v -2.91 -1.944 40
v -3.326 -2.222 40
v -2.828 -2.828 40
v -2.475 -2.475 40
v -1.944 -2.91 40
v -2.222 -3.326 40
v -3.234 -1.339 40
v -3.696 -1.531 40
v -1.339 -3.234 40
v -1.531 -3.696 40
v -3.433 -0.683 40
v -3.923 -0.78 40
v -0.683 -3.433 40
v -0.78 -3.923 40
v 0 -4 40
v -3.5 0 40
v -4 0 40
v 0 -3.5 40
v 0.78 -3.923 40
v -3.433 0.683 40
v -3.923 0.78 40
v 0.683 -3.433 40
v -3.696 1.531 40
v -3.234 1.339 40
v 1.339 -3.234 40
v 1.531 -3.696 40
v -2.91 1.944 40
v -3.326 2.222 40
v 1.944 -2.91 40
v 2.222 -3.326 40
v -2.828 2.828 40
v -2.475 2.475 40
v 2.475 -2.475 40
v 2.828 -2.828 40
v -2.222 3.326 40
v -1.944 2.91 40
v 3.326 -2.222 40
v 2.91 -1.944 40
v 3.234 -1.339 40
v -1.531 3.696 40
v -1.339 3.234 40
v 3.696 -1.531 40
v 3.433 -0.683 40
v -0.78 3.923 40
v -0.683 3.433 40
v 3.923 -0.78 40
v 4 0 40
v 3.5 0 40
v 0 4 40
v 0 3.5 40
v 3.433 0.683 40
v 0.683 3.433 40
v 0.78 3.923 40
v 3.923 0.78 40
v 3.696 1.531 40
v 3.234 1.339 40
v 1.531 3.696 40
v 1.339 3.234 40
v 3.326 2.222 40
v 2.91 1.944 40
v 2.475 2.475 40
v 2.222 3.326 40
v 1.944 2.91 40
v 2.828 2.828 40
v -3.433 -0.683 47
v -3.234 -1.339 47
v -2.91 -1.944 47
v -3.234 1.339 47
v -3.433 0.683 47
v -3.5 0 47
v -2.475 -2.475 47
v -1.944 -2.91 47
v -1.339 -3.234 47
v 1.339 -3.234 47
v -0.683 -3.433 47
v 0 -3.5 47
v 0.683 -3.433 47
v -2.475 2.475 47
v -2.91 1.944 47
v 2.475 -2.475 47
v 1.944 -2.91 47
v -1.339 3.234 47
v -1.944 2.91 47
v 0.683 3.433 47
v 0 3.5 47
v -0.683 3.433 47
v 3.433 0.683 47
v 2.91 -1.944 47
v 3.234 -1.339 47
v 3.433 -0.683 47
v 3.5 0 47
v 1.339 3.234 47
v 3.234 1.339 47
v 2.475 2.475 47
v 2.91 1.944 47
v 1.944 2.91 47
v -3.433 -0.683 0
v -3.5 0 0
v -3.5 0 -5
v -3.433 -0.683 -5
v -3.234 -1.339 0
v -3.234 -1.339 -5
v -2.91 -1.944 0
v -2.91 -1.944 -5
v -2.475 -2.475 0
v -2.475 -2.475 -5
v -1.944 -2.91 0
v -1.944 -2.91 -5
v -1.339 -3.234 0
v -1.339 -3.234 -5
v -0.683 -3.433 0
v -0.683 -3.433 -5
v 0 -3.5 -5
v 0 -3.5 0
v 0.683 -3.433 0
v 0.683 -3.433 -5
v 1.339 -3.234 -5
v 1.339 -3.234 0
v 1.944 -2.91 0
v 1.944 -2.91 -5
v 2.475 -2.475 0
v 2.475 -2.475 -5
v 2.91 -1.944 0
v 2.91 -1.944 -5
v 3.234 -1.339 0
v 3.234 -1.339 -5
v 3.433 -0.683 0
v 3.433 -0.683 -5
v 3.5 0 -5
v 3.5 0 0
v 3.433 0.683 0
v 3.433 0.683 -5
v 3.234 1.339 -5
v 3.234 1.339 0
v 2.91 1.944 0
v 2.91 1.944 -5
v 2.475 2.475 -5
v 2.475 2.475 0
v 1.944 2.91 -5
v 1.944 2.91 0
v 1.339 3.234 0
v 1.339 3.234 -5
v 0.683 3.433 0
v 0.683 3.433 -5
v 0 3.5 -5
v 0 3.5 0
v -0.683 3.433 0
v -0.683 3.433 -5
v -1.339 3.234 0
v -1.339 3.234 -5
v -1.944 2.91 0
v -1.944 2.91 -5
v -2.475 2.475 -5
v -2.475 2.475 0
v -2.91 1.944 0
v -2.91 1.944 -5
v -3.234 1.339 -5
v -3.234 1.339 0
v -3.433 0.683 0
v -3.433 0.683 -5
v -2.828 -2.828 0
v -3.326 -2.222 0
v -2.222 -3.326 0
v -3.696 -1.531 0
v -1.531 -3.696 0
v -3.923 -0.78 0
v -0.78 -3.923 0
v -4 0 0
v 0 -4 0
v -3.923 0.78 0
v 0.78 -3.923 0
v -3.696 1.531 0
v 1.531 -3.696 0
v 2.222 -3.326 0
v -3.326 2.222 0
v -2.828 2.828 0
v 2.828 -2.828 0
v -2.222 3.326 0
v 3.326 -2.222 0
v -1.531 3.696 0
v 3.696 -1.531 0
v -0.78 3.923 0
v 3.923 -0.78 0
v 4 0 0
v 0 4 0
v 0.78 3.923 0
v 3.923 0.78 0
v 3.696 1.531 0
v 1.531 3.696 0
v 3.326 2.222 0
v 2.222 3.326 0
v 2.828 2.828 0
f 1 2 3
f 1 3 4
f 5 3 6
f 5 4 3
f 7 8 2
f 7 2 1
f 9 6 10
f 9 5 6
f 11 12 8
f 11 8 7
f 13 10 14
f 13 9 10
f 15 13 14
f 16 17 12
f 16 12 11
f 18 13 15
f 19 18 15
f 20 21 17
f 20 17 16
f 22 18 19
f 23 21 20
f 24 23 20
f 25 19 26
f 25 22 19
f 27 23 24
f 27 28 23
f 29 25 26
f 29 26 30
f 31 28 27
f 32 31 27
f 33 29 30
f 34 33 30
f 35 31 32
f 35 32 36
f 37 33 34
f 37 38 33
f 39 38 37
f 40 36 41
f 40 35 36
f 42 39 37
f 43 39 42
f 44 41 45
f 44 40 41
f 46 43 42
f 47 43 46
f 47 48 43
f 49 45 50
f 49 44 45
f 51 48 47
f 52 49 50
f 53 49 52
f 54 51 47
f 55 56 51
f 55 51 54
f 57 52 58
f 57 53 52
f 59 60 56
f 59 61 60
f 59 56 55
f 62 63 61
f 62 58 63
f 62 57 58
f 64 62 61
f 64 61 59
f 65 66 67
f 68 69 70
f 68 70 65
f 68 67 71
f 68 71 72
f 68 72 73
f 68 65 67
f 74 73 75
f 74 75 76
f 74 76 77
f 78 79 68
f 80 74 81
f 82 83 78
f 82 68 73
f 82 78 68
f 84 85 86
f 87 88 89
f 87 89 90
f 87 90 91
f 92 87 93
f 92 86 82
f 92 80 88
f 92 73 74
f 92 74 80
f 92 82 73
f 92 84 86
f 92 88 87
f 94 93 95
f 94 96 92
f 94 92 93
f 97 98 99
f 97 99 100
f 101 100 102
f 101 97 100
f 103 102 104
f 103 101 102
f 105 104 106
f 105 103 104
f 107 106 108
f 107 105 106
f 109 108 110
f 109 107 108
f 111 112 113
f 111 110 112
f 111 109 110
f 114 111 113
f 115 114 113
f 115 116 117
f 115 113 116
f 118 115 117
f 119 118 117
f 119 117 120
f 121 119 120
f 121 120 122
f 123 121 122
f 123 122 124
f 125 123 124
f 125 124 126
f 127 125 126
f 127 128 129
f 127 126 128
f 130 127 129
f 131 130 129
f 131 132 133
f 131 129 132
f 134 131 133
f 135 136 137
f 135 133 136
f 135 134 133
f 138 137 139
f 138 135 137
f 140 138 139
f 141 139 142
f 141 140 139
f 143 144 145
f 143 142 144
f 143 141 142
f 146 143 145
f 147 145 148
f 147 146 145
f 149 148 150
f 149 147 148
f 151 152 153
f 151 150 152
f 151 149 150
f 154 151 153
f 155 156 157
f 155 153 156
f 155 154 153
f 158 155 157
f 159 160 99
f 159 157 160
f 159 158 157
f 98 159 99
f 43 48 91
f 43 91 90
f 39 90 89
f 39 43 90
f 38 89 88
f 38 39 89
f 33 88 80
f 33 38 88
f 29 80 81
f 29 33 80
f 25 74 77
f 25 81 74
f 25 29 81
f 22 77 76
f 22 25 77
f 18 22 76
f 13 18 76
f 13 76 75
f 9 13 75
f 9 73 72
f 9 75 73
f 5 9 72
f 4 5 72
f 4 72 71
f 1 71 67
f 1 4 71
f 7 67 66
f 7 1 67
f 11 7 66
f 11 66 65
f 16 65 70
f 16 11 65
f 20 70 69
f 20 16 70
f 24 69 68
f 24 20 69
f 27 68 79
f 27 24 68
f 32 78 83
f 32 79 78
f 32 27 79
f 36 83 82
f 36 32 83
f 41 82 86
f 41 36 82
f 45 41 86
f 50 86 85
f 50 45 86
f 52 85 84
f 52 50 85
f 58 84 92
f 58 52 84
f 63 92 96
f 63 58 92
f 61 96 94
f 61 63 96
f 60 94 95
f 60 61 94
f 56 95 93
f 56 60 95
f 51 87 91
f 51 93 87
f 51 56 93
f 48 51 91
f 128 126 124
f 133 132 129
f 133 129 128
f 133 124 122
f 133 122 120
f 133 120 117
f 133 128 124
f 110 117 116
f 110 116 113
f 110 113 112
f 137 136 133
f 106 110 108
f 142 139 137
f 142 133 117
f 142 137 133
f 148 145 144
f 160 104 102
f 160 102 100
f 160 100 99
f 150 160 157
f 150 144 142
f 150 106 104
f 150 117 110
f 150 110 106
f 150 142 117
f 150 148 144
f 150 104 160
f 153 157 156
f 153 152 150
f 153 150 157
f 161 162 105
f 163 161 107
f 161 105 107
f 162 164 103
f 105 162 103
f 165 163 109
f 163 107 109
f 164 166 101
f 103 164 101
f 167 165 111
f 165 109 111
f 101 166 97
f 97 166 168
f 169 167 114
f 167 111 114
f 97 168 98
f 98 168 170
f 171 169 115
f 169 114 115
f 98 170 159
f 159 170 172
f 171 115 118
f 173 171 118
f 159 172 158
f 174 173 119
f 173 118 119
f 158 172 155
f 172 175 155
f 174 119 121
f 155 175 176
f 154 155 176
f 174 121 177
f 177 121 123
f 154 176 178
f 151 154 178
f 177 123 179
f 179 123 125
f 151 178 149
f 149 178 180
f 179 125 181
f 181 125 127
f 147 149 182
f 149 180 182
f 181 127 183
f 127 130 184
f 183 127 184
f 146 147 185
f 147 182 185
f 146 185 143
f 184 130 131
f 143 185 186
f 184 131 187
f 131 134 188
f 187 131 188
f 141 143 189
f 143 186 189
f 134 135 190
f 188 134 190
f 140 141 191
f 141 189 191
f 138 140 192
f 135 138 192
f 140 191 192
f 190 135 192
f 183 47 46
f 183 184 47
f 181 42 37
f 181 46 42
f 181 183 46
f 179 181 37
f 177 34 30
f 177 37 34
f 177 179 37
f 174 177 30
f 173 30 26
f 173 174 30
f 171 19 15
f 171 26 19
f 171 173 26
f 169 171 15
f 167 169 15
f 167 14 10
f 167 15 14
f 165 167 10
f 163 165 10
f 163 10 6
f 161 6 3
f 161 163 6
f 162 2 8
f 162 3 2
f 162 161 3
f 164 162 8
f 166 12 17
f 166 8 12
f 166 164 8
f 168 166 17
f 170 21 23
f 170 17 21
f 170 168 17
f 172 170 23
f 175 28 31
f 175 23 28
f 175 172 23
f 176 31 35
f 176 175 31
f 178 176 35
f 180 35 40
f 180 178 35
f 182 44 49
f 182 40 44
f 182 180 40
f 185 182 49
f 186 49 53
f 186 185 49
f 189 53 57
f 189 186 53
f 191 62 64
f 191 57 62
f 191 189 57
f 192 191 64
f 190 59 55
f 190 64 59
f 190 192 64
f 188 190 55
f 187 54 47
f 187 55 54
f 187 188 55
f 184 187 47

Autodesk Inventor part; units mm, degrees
ref_plane "YZ Plane" through (0, 0, 0) normal (1, 0, 0) x (0, 1, 0)
ref_plane "XZ Plane" through (0, 0, 0) normal (0, 1, 0) x (-1, 0, 0)
ref_plane "XY Plane" through (0, 0, 0) normal (0, 0, 1) x (1, 0, 0)
sketch "Skizze1" plane through (0, 0, 0) normal (0, 0, 1) x (1, 0, 0)
  circle A0 centre (0, 0) radius 4
  dimension "d0" = 8
extrude "Extrusion1" add sketch "Skizze1" along normal blind 40
sketch "Skizze2" plane through (0, 0, 0) normal (0, 0, -1) x (-1, 0, 0)
  circle A0 centre (0, 0) radius 3.5
  dimension "d3" = 7
extrude "Extrusion2" add sketch "Skizze2" along normal blind 5
thread "Gewinde1" size "M8x1.25" class "6g" standard "ANSI Metric M Profile" full length
sketch "Skizze3" plane through (0, 0, 40) normal (0, 0, 1) x (1, 0, 0)
  circle A0 centre (0, 0) radius 3.5
  dimension "d8" = 7
extrude "Extrusion3" add sketch "Skizze3" along normal blind 7
properties part number "M8 inductive probe"
